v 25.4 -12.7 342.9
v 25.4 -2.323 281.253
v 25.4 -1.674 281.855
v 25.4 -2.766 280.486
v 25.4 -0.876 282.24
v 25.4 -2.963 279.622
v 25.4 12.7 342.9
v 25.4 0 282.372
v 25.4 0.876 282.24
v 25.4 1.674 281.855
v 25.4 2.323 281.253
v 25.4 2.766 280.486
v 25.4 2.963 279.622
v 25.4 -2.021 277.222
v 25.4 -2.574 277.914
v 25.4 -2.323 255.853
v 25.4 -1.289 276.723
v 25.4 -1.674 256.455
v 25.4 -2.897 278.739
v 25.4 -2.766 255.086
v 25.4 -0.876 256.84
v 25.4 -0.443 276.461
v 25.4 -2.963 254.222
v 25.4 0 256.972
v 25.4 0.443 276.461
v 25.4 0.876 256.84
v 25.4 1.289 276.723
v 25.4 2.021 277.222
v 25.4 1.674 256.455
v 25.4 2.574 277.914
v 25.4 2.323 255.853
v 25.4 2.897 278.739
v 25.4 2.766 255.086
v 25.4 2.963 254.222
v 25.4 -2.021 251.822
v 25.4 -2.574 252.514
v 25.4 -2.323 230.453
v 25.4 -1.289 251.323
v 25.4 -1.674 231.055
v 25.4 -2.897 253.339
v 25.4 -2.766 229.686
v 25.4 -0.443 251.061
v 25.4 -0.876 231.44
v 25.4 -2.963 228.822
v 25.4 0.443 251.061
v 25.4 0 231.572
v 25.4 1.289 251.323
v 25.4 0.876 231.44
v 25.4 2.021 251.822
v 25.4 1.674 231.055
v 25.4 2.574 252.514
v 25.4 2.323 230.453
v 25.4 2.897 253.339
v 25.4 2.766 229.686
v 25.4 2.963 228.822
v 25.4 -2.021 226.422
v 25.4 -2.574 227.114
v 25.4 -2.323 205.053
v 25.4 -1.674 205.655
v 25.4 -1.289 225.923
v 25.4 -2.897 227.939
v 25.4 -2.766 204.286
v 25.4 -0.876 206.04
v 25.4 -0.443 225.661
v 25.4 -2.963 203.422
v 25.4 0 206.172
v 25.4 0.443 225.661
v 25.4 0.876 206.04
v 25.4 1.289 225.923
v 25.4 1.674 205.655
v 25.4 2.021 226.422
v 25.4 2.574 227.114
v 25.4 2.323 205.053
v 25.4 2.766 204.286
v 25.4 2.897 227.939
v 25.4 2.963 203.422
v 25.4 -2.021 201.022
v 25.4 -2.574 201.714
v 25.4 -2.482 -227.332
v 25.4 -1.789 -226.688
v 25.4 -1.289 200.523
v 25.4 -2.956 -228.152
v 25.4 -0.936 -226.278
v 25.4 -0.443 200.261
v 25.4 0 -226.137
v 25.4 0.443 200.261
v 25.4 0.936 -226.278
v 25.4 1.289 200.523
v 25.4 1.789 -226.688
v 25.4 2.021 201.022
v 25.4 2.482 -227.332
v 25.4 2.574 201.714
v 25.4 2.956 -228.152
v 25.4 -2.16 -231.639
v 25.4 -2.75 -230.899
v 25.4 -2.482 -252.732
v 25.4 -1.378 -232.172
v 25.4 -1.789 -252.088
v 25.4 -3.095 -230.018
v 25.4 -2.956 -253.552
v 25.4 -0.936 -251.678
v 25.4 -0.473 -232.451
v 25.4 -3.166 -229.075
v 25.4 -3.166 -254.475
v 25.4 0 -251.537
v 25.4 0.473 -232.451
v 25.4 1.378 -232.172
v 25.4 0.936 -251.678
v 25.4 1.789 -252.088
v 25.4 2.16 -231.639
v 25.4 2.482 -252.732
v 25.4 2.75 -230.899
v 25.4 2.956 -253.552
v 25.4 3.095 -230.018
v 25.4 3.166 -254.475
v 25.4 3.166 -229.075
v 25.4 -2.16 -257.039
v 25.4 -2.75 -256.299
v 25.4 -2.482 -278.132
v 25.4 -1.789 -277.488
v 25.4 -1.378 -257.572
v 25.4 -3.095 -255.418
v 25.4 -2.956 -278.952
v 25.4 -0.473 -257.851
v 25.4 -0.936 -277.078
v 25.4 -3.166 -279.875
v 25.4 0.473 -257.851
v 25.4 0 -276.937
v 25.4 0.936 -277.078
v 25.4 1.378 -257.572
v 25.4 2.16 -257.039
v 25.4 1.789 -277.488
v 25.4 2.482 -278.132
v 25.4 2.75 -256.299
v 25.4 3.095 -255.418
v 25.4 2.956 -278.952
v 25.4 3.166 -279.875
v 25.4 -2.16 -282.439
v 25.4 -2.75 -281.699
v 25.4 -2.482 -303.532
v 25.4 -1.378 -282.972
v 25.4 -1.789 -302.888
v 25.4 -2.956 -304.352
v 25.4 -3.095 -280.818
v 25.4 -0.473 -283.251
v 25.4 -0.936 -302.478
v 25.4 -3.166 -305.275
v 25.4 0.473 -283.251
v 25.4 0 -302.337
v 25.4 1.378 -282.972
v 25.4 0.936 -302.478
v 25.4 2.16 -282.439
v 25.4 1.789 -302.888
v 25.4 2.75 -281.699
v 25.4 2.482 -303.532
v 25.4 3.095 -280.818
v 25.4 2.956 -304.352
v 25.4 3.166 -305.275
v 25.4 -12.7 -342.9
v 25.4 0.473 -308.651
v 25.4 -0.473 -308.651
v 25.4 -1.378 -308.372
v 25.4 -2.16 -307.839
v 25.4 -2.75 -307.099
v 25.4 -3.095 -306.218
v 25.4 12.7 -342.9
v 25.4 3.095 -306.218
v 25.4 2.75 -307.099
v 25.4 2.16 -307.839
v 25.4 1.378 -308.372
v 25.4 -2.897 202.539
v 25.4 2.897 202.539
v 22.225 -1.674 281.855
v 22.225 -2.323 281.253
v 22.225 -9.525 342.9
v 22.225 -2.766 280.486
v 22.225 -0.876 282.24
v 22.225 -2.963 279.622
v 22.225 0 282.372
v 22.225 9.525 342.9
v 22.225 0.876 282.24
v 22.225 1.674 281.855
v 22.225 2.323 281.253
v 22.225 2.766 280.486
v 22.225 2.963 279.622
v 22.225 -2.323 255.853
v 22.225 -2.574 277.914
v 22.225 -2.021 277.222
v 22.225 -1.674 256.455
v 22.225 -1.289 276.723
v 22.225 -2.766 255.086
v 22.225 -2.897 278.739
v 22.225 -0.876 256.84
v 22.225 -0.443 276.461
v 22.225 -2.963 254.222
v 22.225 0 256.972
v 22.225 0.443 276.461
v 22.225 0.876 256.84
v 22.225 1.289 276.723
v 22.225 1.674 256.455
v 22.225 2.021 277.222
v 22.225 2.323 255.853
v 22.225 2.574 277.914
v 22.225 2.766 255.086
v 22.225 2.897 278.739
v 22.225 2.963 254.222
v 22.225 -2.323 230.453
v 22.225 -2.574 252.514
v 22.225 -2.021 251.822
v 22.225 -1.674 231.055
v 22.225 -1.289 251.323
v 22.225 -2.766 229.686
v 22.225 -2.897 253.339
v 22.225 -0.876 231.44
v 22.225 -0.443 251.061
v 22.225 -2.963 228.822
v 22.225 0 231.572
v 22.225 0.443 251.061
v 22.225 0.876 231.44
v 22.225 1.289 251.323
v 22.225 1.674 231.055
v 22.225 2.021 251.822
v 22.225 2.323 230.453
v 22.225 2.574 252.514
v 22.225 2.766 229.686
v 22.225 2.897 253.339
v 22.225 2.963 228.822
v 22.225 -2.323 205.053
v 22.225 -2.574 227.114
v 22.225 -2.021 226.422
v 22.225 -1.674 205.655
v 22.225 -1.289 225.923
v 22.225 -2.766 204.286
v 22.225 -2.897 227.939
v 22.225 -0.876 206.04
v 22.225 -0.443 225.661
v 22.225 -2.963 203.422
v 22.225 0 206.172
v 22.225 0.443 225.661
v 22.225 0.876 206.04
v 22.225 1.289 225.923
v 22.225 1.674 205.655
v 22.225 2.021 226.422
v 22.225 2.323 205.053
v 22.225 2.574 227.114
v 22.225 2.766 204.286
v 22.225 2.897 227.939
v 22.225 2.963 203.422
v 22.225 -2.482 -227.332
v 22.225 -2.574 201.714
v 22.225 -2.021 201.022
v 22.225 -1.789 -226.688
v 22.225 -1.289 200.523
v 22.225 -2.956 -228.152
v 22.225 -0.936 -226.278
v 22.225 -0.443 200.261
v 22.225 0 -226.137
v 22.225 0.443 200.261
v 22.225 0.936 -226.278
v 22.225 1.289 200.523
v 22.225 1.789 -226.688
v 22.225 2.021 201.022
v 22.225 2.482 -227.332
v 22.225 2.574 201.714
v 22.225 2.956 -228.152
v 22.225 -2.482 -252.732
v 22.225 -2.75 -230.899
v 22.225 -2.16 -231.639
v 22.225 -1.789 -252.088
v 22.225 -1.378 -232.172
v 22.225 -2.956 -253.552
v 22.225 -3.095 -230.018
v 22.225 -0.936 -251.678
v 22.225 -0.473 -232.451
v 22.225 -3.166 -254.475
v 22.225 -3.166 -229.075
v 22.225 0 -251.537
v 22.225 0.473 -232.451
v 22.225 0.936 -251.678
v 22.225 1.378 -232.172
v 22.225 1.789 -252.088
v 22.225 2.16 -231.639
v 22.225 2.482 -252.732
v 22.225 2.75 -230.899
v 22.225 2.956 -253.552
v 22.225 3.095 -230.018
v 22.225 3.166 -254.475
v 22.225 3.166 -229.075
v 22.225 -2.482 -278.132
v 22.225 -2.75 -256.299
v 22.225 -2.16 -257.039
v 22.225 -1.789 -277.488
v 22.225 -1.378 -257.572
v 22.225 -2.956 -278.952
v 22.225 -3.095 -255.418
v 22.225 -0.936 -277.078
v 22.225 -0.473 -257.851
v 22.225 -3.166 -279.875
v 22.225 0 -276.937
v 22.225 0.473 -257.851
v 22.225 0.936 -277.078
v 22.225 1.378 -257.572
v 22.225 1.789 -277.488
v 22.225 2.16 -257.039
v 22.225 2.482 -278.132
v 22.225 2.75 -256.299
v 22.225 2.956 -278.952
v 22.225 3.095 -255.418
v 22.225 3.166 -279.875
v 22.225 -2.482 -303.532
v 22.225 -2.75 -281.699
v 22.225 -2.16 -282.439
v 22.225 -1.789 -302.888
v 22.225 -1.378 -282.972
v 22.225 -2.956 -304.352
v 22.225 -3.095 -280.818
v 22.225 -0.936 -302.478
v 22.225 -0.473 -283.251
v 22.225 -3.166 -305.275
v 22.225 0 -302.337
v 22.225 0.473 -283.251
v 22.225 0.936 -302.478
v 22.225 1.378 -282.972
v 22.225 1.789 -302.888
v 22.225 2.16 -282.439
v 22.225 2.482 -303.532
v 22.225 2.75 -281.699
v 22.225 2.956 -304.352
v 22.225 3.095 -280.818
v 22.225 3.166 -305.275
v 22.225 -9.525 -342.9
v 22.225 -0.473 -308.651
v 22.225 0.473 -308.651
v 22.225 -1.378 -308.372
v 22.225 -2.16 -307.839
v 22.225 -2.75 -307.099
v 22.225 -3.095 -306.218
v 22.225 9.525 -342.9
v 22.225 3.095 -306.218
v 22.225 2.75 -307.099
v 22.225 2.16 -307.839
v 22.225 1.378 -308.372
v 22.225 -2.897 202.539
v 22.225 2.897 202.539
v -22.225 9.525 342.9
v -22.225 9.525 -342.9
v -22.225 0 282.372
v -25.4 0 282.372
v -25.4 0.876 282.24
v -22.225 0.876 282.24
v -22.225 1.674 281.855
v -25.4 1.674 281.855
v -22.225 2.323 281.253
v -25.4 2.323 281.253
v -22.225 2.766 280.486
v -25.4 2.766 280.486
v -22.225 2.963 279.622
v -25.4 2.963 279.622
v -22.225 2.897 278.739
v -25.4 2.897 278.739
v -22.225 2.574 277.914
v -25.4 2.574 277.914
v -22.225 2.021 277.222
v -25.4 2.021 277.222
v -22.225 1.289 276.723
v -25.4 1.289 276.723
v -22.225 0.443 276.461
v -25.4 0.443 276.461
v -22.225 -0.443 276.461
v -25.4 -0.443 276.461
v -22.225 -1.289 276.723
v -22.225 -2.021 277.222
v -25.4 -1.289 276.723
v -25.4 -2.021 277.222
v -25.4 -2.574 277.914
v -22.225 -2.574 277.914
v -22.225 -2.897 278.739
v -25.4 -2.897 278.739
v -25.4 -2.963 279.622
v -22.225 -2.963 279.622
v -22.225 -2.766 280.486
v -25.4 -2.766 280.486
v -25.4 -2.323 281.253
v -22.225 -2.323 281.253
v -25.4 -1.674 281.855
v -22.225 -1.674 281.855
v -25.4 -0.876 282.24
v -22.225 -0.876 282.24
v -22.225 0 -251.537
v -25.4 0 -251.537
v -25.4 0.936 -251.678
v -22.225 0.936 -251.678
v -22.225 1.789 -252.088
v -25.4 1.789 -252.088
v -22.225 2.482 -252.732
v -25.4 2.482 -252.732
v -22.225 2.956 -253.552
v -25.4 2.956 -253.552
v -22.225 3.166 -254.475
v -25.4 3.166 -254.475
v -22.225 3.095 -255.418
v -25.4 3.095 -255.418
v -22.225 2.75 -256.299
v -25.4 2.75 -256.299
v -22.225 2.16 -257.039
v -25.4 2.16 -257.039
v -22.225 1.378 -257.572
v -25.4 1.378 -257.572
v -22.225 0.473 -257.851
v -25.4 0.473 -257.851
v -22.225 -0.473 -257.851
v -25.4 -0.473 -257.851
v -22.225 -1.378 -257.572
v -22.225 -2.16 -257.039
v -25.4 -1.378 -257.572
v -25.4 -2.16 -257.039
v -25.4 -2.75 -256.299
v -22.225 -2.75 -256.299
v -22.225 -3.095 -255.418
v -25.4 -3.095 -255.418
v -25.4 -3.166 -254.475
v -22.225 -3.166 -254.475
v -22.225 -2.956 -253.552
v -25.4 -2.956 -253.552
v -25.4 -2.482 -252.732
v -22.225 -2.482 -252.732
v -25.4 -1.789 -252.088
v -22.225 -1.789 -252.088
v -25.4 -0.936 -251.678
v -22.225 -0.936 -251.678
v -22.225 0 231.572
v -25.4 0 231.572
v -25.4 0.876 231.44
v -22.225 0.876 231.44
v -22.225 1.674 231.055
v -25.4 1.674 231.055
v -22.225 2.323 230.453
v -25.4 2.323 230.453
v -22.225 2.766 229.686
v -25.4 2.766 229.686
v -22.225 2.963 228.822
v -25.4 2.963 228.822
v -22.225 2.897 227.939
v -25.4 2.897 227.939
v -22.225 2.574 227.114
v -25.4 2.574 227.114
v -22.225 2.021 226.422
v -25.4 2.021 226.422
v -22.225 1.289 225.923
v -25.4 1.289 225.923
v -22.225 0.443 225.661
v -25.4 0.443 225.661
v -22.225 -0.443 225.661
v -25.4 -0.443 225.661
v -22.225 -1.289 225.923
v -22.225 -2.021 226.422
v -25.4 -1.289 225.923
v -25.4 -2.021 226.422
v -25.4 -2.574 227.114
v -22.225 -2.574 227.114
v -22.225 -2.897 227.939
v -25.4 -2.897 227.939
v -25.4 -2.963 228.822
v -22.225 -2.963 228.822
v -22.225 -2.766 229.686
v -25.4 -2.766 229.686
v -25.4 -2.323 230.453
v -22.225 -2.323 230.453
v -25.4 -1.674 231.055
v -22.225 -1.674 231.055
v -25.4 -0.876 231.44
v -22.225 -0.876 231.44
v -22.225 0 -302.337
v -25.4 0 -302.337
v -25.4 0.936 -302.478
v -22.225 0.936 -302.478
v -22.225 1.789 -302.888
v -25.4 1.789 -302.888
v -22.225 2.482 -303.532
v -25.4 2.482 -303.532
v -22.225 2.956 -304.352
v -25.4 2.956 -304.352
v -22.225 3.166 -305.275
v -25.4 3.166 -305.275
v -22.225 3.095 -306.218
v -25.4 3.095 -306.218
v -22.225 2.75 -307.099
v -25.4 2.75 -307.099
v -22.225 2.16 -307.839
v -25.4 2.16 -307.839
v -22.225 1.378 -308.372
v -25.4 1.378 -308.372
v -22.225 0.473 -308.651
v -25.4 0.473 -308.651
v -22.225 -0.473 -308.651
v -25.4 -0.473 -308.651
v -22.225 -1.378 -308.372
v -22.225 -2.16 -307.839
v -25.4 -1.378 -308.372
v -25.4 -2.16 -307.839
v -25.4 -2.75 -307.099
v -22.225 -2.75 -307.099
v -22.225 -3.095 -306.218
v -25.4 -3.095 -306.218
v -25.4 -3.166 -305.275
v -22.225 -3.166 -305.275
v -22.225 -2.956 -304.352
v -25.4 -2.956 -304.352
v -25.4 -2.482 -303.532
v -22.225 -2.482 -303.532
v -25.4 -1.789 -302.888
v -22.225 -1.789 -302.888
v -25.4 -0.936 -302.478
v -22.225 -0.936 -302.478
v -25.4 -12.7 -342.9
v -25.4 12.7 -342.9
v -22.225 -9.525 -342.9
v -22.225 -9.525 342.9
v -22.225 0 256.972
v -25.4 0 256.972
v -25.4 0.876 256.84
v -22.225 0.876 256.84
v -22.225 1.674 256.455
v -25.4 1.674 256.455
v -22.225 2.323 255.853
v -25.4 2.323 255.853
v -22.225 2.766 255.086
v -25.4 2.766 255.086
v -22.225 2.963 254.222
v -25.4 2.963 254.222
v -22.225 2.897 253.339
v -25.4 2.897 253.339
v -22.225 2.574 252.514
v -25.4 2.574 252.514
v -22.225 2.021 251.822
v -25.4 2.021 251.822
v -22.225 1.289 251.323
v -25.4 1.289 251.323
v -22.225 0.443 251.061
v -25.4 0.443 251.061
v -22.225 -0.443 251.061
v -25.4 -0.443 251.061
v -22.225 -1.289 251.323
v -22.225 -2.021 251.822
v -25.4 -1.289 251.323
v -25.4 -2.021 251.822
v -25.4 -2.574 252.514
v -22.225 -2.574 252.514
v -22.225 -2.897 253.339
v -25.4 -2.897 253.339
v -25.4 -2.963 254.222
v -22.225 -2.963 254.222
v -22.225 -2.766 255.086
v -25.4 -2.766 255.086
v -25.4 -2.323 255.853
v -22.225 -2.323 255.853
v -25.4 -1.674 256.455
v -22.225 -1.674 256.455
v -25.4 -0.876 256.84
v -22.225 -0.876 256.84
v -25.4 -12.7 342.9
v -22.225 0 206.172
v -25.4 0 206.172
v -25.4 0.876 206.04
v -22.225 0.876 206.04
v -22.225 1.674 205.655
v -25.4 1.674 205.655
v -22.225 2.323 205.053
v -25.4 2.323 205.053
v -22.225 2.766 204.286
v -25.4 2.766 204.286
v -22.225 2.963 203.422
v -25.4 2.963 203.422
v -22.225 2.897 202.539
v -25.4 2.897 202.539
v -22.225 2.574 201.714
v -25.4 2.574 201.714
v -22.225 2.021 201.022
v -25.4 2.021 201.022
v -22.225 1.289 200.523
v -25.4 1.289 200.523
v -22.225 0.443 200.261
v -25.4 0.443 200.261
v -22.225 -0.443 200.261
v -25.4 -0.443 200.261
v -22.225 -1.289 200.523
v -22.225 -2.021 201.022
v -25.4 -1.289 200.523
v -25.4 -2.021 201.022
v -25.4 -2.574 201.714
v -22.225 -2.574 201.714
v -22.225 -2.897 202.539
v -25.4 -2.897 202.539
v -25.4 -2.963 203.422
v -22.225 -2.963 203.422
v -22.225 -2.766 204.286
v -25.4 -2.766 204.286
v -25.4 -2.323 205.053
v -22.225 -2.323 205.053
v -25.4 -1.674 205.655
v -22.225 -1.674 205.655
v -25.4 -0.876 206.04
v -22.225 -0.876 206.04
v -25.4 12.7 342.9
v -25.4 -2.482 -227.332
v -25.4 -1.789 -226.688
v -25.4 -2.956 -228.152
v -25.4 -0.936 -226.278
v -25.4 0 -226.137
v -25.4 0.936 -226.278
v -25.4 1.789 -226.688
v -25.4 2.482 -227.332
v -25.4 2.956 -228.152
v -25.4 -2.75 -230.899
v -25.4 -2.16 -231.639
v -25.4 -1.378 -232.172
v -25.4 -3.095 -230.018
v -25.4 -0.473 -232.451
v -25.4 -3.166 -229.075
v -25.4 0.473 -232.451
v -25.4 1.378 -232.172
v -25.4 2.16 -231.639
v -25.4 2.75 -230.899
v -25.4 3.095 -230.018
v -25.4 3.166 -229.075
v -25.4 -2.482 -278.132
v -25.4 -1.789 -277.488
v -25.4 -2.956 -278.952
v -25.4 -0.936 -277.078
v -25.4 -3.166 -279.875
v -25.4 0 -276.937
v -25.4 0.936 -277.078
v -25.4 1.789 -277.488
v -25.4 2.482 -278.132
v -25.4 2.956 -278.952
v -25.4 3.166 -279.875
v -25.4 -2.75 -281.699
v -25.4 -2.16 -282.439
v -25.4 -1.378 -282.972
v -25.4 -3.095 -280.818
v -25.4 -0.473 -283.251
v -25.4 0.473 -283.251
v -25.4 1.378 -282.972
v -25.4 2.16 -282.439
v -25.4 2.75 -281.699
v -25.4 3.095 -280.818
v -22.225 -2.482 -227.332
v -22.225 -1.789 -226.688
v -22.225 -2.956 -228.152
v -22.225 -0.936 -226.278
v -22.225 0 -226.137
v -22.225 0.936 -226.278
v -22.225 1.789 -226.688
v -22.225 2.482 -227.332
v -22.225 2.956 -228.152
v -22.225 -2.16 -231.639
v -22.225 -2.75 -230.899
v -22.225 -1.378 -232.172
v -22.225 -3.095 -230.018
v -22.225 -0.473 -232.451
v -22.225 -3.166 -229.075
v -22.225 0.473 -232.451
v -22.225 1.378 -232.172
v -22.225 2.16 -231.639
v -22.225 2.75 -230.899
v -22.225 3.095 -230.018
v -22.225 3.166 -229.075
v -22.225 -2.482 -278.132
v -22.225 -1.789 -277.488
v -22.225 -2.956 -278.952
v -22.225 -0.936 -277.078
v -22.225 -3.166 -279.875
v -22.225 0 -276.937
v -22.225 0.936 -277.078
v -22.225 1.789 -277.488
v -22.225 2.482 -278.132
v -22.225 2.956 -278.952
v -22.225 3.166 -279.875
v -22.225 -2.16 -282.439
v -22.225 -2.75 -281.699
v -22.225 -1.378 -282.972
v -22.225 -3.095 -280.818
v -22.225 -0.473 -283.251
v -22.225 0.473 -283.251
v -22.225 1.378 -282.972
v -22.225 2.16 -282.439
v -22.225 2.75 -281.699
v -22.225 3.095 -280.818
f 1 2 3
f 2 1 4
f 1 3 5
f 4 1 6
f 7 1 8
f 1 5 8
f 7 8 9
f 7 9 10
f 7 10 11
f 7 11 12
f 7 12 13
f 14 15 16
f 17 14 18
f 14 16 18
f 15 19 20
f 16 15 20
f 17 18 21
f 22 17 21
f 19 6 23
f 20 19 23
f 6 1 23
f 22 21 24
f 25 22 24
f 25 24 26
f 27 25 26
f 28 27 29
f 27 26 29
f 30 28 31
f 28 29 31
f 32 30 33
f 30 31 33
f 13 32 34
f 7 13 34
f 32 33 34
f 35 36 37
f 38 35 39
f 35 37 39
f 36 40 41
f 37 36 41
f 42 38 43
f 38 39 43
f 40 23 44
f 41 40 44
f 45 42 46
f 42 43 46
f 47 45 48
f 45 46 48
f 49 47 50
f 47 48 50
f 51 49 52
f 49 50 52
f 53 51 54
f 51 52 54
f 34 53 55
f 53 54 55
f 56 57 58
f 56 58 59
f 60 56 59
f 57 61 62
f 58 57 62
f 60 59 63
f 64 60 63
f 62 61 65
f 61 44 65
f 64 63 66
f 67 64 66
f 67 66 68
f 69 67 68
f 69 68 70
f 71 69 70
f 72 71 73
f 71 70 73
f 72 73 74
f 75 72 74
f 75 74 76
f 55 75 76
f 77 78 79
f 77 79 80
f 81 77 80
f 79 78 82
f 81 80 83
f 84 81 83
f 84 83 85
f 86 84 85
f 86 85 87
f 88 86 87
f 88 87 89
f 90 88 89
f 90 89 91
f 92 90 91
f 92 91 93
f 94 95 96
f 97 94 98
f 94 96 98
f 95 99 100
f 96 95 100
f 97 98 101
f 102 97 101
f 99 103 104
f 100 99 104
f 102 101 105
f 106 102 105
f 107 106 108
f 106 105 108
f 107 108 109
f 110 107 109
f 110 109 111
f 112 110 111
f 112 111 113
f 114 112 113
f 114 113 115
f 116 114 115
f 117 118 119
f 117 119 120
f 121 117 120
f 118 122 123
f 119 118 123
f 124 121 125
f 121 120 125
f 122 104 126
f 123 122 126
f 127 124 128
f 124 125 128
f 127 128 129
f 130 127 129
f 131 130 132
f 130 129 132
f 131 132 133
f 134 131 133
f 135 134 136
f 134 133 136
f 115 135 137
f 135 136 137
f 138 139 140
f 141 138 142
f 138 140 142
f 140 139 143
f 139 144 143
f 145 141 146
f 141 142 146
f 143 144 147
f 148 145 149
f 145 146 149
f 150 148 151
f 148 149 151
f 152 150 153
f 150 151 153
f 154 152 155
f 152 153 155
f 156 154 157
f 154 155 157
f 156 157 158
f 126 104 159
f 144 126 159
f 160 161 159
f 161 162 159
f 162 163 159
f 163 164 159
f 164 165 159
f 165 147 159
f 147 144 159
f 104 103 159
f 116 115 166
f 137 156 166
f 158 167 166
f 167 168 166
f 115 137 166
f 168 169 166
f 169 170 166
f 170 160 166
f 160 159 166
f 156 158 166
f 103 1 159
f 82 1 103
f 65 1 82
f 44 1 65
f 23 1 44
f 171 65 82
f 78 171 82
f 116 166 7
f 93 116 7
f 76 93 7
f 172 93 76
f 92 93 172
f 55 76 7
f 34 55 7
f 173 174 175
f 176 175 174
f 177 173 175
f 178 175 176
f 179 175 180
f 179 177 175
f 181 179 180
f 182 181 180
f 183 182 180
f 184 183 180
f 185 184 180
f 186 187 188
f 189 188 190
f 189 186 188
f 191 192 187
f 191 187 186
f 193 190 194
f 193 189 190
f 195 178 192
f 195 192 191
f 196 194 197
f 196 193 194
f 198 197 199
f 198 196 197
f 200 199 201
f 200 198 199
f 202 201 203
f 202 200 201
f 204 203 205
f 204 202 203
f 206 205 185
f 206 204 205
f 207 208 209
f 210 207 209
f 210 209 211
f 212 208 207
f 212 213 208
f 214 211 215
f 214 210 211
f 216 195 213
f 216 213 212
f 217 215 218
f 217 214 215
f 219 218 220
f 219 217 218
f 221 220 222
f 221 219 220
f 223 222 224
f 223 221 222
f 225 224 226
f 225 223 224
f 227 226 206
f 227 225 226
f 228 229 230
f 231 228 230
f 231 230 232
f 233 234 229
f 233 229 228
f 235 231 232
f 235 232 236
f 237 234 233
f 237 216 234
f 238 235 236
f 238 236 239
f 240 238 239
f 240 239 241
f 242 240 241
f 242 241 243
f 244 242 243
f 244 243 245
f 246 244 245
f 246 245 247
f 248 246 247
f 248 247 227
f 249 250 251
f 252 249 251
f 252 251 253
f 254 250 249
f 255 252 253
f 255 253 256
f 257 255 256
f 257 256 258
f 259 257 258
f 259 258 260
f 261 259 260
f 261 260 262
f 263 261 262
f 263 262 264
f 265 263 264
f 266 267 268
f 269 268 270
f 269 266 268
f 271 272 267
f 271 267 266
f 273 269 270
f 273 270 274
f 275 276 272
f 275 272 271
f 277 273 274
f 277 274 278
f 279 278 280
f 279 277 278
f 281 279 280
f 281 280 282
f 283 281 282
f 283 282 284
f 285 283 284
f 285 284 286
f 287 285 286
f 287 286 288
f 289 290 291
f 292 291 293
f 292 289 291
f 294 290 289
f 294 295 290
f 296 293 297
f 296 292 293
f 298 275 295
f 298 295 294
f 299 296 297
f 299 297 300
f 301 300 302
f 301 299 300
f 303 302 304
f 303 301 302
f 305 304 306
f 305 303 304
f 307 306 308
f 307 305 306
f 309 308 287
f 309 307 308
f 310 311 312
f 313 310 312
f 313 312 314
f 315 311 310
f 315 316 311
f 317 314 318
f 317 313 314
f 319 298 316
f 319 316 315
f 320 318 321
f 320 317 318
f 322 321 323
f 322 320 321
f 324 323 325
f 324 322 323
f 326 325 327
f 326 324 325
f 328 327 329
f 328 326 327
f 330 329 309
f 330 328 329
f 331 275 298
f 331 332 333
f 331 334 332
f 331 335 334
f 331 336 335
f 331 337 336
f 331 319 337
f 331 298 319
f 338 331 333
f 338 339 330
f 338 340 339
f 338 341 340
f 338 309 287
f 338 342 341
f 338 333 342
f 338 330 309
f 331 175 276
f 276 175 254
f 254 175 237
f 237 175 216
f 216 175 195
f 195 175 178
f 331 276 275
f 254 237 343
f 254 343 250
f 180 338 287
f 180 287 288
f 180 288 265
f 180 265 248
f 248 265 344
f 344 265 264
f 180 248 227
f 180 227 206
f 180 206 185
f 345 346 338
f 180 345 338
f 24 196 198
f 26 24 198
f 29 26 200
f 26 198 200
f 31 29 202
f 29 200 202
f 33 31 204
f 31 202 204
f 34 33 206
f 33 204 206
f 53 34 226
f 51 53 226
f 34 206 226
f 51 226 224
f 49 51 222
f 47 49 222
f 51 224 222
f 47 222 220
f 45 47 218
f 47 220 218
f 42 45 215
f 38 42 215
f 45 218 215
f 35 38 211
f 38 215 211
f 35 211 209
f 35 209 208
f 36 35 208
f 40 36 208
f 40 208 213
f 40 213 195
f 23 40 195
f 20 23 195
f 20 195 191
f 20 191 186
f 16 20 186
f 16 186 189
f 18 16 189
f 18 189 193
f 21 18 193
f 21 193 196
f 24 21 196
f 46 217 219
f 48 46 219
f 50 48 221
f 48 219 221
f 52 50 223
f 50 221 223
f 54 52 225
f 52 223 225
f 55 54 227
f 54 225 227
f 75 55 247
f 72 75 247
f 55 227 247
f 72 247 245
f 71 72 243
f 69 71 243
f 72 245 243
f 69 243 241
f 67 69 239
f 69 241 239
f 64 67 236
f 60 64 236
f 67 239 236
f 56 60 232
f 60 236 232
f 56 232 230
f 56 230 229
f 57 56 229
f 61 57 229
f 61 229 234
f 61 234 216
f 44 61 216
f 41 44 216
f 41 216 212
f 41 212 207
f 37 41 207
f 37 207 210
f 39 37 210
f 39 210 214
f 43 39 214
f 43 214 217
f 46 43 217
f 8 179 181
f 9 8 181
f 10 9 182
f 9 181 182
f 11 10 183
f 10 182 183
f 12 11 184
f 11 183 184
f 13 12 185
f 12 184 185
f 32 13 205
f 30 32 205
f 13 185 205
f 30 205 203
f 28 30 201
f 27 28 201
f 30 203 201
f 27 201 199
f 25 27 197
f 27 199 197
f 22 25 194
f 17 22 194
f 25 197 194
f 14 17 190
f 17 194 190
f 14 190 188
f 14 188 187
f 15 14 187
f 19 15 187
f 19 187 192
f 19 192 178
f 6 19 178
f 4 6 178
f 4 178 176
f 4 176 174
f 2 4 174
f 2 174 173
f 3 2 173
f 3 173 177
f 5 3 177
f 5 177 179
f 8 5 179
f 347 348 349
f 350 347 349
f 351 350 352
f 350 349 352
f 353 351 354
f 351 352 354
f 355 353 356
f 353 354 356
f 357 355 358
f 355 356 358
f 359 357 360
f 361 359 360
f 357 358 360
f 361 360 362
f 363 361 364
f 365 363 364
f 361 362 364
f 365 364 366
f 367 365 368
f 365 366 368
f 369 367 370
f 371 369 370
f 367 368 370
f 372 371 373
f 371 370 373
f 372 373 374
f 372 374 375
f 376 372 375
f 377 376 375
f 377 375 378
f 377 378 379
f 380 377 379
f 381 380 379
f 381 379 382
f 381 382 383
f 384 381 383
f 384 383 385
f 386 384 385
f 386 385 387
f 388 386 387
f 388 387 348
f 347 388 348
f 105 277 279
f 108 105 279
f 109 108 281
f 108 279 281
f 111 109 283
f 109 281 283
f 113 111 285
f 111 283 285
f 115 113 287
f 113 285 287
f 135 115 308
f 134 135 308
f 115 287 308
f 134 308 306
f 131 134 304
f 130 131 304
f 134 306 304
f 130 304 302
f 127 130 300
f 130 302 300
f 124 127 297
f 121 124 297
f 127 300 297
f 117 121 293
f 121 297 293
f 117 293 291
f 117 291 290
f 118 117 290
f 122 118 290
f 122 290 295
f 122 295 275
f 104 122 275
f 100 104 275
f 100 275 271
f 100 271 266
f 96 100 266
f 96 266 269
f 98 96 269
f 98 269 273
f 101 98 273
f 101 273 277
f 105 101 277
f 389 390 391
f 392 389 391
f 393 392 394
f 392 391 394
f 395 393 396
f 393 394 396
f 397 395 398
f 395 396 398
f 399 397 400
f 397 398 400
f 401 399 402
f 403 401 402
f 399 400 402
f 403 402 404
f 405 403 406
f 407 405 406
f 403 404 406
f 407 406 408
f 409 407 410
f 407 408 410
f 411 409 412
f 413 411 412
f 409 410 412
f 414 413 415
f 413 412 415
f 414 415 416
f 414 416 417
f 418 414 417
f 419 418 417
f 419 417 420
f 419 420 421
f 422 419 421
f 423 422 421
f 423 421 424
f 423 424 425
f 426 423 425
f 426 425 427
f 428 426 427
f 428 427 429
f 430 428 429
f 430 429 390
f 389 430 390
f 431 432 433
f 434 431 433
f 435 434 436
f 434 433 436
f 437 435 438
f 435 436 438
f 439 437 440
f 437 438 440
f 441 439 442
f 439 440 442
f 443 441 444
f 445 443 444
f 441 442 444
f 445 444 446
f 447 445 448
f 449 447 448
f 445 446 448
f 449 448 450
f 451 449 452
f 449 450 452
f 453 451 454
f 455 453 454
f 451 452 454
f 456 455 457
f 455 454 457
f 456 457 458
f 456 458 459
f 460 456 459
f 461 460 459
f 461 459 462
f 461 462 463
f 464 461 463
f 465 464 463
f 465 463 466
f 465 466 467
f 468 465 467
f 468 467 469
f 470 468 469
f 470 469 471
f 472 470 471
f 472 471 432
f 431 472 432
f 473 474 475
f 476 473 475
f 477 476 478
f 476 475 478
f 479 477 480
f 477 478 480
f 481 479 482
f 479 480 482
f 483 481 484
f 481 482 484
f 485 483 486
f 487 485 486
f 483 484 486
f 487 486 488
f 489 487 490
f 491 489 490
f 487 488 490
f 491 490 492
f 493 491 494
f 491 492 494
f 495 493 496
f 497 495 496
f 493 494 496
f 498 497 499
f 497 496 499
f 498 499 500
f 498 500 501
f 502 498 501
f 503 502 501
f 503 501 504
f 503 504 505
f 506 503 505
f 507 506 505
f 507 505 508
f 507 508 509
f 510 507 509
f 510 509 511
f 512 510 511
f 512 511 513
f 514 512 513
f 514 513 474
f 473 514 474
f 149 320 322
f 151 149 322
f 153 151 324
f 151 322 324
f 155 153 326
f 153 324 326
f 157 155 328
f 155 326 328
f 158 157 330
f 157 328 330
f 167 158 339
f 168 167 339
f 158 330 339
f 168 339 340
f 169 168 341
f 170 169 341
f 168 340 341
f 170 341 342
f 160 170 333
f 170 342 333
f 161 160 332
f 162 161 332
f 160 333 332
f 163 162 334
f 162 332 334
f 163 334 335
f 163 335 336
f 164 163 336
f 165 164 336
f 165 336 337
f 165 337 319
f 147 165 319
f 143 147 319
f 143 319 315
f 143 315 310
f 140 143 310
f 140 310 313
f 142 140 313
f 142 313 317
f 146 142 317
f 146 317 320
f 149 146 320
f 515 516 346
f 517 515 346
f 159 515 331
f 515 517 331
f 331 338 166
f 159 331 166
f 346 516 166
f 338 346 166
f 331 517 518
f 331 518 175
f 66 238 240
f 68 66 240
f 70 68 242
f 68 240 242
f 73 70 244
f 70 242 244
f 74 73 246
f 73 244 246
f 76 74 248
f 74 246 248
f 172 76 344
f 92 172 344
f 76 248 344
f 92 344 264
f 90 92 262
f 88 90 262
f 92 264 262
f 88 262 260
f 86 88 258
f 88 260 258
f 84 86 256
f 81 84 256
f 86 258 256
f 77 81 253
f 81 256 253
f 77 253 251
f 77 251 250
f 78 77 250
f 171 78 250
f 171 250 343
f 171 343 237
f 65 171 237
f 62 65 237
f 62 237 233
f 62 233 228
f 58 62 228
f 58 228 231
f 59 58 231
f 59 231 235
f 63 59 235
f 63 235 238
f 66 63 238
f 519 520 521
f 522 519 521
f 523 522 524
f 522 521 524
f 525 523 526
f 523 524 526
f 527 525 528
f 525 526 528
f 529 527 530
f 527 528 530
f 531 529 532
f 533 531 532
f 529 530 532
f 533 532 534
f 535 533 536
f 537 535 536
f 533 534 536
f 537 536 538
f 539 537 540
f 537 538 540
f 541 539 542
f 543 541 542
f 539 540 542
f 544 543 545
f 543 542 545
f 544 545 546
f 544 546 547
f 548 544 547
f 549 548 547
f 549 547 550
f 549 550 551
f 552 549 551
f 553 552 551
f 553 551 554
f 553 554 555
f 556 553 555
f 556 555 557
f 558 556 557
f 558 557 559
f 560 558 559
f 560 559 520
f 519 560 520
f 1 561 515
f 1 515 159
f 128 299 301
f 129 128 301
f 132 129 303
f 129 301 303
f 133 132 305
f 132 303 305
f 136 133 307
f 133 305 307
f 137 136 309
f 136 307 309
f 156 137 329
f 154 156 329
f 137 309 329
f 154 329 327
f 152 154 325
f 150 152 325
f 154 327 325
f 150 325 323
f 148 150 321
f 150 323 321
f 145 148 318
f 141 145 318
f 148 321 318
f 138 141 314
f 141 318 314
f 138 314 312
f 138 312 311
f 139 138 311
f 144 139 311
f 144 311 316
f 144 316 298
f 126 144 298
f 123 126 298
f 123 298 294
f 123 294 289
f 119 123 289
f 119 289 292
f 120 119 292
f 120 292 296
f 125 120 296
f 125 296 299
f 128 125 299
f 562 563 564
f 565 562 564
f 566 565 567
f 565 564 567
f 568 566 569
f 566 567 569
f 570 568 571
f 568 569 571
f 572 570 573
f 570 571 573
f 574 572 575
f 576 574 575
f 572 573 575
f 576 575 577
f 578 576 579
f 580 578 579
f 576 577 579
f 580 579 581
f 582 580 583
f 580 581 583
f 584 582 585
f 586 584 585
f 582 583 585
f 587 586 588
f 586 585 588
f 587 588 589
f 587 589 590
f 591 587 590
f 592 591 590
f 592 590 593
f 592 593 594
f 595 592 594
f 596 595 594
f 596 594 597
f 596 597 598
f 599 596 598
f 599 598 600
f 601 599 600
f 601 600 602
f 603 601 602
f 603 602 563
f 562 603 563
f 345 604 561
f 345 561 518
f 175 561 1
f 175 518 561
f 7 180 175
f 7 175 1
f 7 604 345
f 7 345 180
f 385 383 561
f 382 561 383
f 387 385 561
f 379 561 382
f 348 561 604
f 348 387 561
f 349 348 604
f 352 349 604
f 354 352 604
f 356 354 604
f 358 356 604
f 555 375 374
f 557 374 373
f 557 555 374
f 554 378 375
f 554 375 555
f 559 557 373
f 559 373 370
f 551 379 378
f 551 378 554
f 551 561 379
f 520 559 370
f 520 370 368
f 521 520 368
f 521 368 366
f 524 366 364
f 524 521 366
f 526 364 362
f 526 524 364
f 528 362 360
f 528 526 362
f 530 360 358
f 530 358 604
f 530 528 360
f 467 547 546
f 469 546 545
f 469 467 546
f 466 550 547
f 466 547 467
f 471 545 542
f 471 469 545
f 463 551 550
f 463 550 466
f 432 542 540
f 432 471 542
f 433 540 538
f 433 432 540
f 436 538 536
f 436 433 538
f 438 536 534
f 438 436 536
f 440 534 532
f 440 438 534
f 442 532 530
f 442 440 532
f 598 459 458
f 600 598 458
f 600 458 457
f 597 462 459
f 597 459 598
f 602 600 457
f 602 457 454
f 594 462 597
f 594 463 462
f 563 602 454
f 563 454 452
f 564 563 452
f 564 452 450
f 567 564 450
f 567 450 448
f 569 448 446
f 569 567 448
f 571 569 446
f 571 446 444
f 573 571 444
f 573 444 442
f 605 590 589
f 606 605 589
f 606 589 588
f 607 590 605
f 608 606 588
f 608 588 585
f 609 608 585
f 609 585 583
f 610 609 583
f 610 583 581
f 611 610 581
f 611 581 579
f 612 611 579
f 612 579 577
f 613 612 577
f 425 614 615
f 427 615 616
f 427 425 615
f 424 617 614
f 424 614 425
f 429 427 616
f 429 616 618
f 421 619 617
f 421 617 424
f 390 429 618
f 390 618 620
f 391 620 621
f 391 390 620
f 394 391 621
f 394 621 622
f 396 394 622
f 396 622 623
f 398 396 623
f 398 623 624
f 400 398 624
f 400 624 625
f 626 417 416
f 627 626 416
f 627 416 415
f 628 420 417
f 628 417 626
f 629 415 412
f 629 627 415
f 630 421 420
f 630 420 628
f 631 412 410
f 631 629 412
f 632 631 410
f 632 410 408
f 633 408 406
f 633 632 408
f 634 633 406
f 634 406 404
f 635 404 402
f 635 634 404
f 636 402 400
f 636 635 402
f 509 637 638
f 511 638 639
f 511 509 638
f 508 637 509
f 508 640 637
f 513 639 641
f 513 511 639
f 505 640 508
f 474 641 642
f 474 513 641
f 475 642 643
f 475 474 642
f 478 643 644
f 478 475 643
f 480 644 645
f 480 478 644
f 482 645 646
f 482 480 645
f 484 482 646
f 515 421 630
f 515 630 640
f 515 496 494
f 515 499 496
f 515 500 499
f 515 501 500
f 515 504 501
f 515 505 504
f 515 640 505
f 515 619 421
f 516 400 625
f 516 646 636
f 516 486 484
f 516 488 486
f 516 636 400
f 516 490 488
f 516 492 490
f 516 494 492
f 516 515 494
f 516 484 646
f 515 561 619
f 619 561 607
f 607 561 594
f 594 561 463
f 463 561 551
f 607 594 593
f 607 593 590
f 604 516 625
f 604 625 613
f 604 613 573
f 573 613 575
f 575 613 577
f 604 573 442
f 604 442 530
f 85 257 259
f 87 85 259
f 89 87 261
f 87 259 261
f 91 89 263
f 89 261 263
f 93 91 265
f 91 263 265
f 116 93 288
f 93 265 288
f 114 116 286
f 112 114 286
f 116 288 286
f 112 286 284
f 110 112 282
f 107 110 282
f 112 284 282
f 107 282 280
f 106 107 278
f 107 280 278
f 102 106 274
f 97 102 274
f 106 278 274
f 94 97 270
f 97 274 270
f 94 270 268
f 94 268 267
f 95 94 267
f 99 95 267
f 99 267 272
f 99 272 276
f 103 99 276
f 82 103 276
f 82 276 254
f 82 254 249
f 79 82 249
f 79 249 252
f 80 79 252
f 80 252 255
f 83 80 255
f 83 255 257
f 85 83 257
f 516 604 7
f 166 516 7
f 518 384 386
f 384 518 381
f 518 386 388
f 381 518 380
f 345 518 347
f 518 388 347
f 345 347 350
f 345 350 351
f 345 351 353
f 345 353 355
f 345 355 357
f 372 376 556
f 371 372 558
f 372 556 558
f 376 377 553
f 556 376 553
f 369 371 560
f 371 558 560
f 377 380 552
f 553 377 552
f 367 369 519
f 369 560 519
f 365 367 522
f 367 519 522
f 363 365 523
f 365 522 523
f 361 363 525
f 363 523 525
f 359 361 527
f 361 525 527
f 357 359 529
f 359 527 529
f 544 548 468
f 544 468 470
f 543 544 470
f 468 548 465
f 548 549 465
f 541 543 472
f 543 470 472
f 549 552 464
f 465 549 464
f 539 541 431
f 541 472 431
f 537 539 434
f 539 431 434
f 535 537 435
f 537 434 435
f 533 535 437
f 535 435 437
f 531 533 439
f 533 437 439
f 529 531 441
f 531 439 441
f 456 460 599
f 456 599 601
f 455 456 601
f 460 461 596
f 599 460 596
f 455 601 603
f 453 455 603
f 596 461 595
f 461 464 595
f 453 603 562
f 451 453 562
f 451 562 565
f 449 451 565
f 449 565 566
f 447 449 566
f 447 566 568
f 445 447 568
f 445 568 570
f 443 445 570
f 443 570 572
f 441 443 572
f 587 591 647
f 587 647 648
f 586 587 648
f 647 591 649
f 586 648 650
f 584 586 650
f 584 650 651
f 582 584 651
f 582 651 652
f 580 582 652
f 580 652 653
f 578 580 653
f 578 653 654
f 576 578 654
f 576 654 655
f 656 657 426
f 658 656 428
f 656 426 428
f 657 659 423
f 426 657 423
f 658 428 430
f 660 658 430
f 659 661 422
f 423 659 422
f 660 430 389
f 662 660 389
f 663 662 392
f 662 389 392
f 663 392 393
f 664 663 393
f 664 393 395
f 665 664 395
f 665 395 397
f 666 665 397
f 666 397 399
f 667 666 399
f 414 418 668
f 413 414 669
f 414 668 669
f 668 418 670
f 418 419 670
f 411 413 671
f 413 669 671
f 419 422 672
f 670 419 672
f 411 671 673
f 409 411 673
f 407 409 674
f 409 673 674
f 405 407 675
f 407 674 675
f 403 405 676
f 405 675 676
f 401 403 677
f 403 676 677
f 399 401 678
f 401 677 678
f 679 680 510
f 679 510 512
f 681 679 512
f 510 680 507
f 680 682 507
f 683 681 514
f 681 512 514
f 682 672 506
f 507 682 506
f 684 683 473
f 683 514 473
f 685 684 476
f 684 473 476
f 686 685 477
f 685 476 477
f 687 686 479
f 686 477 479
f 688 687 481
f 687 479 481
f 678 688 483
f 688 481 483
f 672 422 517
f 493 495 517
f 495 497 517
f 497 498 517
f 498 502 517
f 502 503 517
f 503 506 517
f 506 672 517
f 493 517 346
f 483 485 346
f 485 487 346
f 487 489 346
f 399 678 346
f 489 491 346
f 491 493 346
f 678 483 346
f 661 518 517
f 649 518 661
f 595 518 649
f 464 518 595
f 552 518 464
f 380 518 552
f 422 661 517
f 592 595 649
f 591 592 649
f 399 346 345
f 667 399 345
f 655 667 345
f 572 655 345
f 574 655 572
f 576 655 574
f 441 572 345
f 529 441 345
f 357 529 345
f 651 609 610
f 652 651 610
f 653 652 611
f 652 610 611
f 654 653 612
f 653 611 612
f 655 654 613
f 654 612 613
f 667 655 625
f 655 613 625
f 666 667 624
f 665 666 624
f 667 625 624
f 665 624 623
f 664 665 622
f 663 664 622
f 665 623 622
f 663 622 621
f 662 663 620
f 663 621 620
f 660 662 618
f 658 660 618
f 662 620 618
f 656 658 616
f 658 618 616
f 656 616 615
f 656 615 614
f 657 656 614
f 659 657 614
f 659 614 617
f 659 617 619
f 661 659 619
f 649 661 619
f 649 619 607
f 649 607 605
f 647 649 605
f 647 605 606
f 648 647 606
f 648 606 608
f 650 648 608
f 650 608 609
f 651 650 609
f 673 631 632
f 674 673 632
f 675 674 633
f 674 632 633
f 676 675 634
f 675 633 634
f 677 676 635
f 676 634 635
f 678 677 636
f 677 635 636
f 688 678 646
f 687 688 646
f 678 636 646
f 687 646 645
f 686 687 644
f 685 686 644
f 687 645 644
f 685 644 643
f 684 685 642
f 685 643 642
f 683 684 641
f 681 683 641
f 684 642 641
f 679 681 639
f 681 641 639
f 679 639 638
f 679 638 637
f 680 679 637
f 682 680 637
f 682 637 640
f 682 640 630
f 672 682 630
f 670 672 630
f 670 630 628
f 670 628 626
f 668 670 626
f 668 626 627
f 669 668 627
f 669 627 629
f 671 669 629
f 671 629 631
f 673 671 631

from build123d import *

# Parameters (mm, degrees)
BOSS_EXTRUDE1_DEPTH         = 342.9
BOSS_EXTRUDE1_DEPTH_BACK    = 342.9
SKETCH3_W                   = 50.8
SKETCH3_H                   = 25.4
SKETCH3_W_2                 = 44.45
SKETCH3_H_2                 = 19.05
A_0_234_DIAMETER_HOLE1_D    = 5.9436
F_1_4_0_25_DIAMETER_HOLE2_D = 6.35


with BuildPart() as part:
    # Sketch3 → Boss-Extrude1 (new, two sides: drawn at the far end of the back side and taken through both)
    with BuildSketch(Plane.XY.offset(-BOSS_EXTRUDE1_DEPTH_BACK)):
        Rectangle(SKETCH3_W, SKETCH3_H)
        Rectangle(SKETCH3_W_2, SKETCH3_H_2, mode=Mode.SUBTRACT)
    extrude(amount=BOSS_EXTRUDE1_DEPTH + BOSS_EXTRUDE1_DEPTH_BACK)

    # A (0.234) Diameter Hole1 (through all)
    with Locations(Plane(origin=(25.4, 0, 0), x_dir=(0, 0, -1), z_dir=(1, 0, 0))):
        with Locations((-279.4, 0), (-254, 0), (-228.6, 0), (-203.2, 0)):
            Hole(A_0_234_DIAMETER_HOLE1_D / 2)

    # 1/4 (0.25) Diameter Hole2 (through all)
    with Locations(Plane(origin=(25.4, 0, 0), x_dir=(0, 0, -1), z_dir=(1, 0, 0))):
        with Locations((305.511799988, 0), (280.111799988, 0), (254.711799988, 0), (229.311799988, 0)):
            Hole(F_1_4_0_25_DIAMETER_HOLE2_D / 2)


solid = part.part
